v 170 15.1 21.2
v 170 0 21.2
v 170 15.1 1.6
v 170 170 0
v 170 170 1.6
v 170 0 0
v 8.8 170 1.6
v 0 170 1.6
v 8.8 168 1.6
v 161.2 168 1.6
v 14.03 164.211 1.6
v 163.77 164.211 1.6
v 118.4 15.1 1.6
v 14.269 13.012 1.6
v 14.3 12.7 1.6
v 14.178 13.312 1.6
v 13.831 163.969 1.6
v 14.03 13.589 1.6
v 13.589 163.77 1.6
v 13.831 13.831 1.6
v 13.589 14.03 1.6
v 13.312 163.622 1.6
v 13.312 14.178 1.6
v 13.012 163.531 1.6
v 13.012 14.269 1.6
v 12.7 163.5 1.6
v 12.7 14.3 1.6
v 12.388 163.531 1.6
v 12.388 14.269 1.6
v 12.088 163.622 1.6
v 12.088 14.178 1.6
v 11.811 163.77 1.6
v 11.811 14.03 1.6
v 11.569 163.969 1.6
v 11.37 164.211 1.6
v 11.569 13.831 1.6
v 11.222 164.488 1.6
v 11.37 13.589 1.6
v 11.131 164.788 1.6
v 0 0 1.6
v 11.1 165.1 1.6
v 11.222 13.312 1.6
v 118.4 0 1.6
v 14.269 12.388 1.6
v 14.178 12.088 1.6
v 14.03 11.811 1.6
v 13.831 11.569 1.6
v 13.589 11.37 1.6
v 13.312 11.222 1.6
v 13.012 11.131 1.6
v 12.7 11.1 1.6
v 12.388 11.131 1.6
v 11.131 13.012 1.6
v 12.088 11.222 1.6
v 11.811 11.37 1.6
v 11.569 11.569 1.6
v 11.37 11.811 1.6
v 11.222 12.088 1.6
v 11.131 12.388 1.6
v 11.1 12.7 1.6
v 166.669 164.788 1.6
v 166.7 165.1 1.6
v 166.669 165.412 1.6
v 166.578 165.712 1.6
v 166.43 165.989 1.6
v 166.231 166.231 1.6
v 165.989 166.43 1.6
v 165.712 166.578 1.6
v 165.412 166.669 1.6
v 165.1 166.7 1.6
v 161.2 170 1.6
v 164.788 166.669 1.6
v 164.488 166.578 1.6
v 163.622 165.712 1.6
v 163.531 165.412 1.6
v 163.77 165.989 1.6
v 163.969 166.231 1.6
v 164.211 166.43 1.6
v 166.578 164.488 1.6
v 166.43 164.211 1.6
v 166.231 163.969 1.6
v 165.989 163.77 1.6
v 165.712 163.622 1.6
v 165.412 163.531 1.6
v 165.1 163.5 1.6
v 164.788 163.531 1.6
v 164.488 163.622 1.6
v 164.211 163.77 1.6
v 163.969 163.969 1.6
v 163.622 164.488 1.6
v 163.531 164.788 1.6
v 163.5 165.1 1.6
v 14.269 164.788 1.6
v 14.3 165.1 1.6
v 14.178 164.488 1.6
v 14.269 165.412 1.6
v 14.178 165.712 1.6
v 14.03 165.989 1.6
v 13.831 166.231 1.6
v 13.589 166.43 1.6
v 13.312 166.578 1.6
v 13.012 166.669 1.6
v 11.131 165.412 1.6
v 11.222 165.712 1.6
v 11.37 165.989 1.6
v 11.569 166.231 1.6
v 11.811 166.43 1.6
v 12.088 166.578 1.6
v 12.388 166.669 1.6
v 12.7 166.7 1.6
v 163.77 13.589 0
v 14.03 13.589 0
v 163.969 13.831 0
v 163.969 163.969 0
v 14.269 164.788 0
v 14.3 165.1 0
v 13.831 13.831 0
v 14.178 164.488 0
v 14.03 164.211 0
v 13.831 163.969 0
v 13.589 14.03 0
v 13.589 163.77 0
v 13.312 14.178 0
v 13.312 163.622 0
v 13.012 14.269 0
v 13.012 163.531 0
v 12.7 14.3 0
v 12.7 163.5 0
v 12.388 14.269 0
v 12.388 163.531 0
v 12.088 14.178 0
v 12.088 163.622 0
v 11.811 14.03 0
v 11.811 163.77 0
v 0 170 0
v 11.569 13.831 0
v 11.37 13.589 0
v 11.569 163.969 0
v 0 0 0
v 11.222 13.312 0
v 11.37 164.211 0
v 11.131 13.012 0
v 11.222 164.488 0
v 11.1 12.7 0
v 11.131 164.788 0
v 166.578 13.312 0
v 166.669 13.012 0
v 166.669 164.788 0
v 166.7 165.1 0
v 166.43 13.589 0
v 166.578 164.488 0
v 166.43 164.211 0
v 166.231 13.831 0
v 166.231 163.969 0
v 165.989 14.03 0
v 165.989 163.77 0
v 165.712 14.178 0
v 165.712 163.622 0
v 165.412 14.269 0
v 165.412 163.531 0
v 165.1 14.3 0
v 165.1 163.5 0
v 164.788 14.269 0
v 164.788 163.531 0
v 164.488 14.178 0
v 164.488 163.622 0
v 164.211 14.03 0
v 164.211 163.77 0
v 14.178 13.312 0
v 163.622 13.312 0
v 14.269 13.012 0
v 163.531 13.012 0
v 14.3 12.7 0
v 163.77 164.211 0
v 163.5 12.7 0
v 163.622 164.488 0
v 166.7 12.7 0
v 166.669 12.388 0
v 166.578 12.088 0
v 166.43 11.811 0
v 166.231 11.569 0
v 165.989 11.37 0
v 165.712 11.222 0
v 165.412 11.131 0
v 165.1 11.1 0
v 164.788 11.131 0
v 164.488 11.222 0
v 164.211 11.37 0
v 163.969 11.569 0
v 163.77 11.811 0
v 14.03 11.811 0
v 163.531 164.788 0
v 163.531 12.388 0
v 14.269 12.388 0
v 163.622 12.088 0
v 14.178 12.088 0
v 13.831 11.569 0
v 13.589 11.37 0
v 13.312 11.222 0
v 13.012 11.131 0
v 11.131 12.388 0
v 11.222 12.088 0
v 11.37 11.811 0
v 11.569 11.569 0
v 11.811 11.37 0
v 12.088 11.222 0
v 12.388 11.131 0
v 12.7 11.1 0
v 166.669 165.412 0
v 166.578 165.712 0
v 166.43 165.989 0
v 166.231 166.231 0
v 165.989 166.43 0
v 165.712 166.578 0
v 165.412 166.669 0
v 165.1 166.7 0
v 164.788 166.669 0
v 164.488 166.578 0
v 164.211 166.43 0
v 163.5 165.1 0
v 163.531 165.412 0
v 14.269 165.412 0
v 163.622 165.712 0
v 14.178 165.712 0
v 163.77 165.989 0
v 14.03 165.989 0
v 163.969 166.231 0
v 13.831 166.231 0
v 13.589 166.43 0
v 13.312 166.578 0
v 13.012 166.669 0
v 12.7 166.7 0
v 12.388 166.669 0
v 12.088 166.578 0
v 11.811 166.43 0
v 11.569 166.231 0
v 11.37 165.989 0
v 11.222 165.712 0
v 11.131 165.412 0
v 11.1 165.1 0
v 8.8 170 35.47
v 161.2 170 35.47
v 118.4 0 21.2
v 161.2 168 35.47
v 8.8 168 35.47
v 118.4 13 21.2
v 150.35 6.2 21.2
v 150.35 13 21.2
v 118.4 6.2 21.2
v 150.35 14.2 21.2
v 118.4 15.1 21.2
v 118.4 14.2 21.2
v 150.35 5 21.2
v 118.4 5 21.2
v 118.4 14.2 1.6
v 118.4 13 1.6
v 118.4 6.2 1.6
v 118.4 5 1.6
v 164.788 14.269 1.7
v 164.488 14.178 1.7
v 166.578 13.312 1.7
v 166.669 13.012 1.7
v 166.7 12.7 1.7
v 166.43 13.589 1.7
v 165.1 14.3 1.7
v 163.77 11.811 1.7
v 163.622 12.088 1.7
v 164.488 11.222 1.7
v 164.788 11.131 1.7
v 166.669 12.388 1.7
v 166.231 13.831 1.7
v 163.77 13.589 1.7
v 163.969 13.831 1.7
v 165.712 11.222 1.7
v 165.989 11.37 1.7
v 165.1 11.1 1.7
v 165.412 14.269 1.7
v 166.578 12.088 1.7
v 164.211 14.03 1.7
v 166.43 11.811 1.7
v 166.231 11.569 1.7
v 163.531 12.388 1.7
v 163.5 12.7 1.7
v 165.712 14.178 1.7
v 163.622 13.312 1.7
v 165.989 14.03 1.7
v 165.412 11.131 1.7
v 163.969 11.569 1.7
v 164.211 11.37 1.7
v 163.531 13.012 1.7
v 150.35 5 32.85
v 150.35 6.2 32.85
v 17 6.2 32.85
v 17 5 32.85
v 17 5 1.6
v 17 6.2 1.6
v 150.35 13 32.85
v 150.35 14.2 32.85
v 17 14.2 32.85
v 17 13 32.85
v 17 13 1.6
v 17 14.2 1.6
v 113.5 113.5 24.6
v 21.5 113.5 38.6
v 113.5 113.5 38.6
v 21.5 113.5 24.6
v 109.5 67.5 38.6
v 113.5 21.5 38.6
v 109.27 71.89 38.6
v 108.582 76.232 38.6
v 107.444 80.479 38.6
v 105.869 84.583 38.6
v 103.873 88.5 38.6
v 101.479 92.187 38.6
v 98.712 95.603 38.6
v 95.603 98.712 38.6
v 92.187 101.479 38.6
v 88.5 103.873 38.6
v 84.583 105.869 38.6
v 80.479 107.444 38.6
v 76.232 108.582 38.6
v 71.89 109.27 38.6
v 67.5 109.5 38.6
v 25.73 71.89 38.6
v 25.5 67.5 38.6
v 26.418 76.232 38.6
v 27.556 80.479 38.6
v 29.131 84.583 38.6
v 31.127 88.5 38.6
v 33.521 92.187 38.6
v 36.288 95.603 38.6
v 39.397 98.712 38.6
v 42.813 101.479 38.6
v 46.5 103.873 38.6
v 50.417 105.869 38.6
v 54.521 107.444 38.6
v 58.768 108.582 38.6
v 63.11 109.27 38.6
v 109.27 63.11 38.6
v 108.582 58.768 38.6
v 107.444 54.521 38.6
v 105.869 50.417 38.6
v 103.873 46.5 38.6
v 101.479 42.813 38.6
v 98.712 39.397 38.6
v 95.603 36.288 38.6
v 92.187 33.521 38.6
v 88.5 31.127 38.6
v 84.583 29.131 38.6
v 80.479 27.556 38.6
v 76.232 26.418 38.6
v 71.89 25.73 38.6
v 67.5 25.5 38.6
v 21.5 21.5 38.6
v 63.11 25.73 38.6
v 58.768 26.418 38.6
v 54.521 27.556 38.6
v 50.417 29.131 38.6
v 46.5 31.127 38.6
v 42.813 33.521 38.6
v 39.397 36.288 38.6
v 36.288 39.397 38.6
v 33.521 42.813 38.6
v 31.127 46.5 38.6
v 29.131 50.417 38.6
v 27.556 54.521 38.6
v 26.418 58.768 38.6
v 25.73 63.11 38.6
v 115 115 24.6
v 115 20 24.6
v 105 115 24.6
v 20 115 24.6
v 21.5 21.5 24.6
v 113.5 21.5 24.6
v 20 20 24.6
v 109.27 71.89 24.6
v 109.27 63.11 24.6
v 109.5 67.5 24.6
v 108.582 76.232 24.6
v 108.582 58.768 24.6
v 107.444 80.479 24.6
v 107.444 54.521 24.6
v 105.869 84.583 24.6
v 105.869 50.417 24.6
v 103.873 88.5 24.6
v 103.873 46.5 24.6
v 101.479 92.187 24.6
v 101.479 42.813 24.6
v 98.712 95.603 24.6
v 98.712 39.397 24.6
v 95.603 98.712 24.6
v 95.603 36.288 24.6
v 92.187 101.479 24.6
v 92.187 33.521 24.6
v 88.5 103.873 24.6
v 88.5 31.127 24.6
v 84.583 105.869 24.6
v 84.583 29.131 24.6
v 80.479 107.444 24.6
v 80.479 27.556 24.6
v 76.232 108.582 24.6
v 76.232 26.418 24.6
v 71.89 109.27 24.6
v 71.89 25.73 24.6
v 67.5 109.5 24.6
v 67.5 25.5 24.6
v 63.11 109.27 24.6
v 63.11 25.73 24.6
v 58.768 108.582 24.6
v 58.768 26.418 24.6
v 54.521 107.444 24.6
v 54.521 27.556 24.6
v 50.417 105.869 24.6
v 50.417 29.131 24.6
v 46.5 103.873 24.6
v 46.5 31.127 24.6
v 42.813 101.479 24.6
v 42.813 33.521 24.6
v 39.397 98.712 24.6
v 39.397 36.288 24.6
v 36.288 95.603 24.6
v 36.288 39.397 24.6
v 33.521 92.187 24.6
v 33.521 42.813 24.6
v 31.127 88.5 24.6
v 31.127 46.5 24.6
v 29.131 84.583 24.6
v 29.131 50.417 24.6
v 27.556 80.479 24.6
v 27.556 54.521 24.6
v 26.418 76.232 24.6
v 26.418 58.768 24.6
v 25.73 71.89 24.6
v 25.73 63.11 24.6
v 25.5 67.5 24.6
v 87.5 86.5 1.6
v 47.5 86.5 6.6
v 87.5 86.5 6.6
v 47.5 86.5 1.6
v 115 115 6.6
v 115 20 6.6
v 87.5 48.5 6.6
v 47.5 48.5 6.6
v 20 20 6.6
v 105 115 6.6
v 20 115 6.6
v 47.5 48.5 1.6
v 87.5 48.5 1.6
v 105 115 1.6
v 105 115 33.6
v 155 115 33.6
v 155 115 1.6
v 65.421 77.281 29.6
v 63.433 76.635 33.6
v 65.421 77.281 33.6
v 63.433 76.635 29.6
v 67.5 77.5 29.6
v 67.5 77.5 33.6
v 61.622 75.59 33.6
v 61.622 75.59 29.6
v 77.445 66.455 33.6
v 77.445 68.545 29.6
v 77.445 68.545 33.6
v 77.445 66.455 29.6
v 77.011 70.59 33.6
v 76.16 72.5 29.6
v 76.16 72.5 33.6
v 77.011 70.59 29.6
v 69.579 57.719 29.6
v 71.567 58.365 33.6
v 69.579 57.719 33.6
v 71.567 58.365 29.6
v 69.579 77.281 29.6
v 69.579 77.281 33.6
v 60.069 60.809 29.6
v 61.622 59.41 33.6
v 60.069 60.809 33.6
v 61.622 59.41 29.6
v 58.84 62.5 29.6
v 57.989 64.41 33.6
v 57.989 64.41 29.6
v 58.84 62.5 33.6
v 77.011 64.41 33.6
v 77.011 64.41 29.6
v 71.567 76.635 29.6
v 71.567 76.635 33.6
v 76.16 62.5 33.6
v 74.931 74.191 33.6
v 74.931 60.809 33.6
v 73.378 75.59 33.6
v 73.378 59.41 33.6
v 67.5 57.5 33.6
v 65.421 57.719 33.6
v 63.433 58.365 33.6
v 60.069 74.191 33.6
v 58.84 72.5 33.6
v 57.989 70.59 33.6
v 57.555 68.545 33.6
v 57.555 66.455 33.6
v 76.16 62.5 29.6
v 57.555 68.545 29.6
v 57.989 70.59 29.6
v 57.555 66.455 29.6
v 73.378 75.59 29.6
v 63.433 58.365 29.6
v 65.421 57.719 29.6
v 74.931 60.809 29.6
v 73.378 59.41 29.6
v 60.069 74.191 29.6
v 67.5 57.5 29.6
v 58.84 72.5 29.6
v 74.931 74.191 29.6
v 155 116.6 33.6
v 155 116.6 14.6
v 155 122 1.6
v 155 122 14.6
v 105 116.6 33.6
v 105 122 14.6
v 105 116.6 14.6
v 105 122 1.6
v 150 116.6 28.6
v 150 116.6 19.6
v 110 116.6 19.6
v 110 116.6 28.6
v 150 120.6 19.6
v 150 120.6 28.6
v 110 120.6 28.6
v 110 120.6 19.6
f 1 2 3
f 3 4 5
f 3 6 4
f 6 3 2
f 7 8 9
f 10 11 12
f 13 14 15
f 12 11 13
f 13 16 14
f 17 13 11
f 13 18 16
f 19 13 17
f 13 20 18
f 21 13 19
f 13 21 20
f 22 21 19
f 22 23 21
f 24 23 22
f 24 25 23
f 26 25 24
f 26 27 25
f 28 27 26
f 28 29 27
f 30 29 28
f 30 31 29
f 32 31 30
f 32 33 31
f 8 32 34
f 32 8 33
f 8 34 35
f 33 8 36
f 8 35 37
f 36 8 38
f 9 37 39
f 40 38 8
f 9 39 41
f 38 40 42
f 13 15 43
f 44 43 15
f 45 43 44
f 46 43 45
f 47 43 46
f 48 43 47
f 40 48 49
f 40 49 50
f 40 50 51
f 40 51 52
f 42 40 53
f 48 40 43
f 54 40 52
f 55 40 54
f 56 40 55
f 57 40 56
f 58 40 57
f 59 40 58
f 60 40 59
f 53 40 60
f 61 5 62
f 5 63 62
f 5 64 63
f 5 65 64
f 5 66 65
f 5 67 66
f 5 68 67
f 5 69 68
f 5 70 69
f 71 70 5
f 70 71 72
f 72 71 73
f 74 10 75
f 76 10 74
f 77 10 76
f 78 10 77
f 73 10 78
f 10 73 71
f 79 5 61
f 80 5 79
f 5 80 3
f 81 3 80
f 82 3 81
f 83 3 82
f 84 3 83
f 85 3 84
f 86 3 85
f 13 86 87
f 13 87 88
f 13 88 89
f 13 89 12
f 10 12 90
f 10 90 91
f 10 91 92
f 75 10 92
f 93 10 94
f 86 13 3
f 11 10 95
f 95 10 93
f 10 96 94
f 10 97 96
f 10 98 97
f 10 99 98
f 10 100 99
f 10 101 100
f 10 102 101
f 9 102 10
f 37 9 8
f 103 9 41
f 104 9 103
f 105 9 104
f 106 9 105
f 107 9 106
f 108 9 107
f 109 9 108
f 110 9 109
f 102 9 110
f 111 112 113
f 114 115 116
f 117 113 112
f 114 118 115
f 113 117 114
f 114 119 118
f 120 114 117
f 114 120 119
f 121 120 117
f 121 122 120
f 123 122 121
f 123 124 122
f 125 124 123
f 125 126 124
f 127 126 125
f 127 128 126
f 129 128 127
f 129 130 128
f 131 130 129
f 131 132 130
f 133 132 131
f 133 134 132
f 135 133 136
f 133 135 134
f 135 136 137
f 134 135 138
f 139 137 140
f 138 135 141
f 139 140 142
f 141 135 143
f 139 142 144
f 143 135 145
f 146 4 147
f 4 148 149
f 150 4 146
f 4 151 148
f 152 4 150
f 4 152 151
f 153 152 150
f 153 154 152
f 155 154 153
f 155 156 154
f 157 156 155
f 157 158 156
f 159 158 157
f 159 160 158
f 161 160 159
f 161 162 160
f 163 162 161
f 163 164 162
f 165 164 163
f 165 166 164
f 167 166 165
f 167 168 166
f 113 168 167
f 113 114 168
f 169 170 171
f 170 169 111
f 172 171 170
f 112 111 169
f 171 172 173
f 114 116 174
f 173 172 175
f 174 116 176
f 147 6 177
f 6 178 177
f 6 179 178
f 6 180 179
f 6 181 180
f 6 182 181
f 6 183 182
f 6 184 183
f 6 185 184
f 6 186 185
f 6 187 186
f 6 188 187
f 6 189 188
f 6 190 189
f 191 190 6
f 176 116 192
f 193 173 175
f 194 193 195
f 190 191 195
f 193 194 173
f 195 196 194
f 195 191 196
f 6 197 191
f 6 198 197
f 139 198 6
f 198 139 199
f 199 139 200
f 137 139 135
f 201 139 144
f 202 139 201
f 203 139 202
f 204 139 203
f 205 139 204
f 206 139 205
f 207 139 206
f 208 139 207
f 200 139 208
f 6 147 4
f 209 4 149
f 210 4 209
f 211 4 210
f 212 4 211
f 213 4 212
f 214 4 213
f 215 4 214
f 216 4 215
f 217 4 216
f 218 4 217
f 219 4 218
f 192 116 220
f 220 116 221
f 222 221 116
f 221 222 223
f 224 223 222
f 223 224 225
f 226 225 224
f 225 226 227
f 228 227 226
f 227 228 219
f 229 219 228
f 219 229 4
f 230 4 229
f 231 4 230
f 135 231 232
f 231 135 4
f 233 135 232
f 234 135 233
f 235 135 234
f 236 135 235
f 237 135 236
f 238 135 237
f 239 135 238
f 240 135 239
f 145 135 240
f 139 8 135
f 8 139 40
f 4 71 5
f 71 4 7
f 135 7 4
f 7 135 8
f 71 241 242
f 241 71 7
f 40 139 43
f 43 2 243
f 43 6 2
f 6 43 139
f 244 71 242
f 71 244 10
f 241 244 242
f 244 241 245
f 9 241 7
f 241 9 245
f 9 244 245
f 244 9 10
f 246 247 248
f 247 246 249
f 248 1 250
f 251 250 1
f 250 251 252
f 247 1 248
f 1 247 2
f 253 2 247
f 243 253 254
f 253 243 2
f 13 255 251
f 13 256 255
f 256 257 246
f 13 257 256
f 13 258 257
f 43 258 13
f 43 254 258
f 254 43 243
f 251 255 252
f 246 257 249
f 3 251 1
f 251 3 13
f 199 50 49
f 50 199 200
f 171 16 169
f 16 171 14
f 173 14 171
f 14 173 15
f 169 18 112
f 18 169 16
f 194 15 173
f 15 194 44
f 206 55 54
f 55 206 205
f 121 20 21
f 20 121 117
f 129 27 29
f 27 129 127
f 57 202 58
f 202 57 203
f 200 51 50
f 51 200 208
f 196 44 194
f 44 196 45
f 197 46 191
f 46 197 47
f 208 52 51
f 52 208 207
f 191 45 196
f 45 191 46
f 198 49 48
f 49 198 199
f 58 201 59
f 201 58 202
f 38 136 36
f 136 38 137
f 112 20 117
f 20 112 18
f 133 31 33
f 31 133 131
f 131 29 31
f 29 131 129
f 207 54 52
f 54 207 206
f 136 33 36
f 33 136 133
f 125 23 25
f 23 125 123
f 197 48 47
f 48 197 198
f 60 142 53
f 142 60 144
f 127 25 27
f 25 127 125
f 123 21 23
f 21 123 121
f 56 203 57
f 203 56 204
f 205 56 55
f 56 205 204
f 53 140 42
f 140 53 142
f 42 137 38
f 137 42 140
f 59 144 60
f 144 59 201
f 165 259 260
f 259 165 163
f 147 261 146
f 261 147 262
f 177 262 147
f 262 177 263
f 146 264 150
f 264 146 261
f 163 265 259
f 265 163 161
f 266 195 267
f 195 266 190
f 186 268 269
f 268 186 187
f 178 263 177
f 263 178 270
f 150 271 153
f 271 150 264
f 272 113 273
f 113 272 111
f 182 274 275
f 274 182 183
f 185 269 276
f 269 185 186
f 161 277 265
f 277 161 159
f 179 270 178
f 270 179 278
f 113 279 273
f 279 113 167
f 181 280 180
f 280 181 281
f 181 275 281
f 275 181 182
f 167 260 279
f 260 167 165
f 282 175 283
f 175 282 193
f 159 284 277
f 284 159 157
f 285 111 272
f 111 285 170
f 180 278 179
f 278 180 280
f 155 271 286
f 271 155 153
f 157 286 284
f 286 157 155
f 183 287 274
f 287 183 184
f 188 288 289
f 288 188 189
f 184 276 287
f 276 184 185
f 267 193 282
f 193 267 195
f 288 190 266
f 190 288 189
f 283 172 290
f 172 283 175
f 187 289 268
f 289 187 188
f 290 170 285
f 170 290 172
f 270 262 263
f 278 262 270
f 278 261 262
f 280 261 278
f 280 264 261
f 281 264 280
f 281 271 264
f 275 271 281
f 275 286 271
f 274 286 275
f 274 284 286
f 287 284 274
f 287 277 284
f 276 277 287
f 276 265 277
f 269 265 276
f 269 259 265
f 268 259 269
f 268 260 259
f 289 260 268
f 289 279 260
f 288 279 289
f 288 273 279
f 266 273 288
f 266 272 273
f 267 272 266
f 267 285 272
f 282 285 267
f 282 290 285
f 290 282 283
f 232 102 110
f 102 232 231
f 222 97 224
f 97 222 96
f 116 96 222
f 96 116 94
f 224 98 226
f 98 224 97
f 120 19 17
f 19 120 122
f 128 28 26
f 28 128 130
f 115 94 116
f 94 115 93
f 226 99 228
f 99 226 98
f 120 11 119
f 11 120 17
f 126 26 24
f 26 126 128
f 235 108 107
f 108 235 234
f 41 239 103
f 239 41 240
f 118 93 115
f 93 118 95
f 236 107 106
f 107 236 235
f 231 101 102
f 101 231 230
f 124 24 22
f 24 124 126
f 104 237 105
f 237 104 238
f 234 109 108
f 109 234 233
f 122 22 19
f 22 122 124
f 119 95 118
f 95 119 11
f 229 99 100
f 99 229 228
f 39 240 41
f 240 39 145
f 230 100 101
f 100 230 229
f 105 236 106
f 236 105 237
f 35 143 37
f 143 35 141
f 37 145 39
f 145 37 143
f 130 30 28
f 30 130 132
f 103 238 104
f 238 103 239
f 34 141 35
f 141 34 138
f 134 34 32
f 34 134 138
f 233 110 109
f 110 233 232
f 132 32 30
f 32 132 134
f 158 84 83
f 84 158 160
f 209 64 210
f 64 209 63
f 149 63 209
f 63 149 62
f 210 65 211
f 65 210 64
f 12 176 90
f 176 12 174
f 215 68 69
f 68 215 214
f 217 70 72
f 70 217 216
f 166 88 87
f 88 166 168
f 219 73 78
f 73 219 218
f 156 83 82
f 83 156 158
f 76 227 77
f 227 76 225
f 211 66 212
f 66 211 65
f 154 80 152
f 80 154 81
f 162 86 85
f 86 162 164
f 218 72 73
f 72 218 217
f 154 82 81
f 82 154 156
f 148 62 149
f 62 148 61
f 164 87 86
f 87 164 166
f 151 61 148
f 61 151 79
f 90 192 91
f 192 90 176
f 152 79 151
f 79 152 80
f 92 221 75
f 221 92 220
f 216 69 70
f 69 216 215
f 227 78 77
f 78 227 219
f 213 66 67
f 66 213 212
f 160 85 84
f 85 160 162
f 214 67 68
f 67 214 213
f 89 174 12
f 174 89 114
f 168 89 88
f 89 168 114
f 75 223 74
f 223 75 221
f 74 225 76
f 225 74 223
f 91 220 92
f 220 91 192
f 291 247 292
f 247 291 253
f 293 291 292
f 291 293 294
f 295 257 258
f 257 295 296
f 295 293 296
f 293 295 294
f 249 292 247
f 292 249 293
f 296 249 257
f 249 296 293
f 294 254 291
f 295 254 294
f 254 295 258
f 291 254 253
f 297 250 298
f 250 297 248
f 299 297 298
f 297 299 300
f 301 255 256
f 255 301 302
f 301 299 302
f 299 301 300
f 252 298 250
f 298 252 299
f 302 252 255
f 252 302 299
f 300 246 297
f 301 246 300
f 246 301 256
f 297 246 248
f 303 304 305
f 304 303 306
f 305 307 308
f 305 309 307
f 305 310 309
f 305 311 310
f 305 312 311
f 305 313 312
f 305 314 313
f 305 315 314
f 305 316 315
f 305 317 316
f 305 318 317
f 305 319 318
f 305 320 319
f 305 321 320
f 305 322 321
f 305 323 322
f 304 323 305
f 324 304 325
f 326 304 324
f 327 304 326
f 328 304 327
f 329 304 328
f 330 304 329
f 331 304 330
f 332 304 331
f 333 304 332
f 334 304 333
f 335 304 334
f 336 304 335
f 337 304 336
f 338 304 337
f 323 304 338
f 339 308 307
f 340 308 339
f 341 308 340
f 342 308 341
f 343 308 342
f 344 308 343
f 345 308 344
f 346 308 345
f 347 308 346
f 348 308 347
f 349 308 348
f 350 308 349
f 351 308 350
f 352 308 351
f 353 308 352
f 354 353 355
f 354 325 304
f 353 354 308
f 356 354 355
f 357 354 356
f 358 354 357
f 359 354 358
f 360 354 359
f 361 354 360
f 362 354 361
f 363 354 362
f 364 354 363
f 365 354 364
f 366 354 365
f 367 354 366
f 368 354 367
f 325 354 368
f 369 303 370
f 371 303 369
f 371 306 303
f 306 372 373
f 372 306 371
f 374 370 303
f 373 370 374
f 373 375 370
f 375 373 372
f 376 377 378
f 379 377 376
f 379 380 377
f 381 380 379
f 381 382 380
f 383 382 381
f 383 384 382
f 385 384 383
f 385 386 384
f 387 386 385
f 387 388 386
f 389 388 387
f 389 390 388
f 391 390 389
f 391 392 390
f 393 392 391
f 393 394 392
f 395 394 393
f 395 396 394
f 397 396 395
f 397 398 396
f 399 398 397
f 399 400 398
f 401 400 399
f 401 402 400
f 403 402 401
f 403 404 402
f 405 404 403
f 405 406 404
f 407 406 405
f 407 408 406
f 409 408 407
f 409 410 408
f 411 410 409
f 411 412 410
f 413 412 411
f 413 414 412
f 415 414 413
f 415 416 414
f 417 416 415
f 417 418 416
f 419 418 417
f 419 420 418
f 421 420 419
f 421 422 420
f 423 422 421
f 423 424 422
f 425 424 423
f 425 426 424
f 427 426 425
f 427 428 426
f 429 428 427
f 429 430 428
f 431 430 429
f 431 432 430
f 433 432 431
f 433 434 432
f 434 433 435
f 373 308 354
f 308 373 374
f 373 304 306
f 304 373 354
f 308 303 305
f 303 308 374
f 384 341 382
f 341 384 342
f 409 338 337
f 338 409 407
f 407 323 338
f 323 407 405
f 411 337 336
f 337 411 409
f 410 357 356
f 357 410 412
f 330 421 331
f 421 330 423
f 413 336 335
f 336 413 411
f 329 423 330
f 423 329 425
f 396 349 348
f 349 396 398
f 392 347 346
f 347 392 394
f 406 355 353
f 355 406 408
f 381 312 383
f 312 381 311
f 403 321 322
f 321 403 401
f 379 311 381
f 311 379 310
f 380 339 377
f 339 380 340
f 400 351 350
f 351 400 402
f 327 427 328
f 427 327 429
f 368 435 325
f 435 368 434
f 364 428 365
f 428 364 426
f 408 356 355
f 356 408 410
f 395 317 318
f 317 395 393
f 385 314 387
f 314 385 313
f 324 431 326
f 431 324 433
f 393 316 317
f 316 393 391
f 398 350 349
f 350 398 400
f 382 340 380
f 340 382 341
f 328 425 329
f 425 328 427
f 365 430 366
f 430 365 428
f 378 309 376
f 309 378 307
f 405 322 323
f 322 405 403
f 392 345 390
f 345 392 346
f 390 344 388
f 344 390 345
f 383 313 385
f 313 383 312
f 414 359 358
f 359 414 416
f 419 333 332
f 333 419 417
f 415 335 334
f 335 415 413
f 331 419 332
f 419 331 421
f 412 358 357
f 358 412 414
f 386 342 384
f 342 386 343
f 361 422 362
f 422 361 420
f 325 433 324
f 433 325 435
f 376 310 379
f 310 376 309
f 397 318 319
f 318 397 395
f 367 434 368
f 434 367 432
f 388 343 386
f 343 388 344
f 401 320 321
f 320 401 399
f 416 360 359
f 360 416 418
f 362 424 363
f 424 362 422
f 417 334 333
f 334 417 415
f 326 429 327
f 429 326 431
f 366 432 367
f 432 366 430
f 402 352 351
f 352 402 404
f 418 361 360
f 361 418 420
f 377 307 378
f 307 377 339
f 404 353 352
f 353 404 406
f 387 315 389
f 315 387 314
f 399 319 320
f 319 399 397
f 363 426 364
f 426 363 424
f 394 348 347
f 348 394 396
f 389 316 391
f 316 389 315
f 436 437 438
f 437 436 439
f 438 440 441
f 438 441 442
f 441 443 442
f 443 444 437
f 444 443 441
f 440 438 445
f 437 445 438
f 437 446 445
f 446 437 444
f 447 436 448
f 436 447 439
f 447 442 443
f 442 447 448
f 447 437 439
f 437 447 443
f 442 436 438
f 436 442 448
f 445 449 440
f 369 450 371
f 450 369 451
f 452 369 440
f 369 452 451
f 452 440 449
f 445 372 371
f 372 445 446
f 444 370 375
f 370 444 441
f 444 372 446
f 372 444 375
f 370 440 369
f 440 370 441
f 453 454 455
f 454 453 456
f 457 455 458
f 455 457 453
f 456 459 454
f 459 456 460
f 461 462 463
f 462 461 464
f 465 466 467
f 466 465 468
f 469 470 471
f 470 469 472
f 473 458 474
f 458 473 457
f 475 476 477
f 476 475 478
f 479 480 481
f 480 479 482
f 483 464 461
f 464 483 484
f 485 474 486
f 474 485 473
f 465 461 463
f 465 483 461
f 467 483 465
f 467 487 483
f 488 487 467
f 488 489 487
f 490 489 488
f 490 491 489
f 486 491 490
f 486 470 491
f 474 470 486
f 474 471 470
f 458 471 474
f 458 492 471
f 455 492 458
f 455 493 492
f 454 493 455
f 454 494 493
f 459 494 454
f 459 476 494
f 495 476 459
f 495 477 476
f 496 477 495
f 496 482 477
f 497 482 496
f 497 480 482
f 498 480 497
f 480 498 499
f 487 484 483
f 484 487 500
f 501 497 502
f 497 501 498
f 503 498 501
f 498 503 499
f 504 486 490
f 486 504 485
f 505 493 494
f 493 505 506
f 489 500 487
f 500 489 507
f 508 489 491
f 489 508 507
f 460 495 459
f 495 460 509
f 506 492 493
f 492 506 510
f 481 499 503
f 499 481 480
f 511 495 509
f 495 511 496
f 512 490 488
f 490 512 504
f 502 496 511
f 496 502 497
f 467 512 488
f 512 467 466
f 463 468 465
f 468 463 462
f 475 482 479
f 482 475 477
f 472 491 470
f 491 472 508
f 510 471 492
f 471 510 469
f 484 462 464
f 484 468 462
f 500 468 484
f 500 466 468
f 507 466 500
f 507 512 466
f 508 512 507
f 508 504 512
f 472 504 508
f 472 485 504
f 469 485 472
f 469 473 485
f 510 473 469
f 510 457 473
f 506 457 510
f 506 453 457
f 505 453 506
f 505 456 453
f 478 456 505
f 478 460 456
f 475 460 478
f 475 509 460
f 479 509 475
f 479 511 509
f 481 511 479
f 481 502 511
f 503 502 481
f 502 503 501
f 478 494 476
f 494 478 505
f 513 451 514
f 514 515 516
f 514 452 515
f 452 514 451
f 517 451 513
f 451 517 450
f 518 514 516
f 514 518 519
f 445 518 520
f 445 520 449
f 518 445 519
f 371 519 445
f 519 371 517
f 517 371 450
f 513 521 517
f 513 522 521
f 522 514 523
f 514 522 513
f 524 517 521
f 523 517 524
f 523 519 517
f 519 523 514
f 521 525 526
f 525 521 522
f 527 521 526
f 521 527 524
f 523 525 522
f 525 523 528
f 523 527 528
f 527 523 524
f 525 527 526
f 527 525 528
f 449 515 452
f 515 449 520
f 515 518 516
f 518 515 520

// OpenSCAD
// file: ../../case/dimensions.scad
// Shared dimensions for all case components
// This file defines common parameters used across multiple case parts

// --- Wall and Material ---
wall_thickness = 3;

// --- Motherboard (Mini-ITX) ---
mobo_width = 170;
mobo_depth = 170;
mobo_pcb_thickness = 1.6;

// --- Standoffs ---
standoff_height = 6;  // Female thread portion of M3x10+6mm male-female standoff
standoff_hole_radius = 1.6;  // M3 clearance (deprecated - see integrated bottom panel design)
standoff_locations = [
    [12.7, 12.7],
    [165.1, 12.7],
    [12.7, 165.1],
    [165.1, 165.1]
];

// --- Standoff Hexagonal Receptacles (Integrated Bottom Panel Design) ---
standoff_boss_height = 2.5;              // Height of hex boss above panel interior surface
standoff_hex_size_flat_to_flat = 5.5;   // Hex size for M3 screw head (flat-to-flat)
standoff_hex_size_point_to_point = 6.35; // Hex size point-to-point (calculated from F-F)
standoff_pocket_depth = 2.2;             // Depth of hex recess for screw head
standoff_boss_diameter = 6.85;           // Overall boss diameter (hex point + FDM tolerance)
standoff_mounting_screw_length = 8;      // M3 x 8mm cap screw (recommended)
standoff_screw_clearance_hole = 3.3;     // M3 clearance hole + FDM tolerance

// --- I/O Shield ---
// Standard ATX I/O shield dimensions
io_shield_width = 158.75;   // 6.25 inches (standard ATX)
io_shield_height = 44.45;   // 1.75 inches (standard ATX)
io_shield_x_offset = (mobo_width - io_shield_width) / 2;
io_shield_z_offset = 5;     // 5mm from bottom of plate

// --- Backplate ---
backplate_height = 88.9;    // 3.5 inches
backplate_thickness = wall_thickness;

// --- CPU Cooler (Noctua NH-L12S) - Minimal/NAS configurations ---
cooler_width = 128;
cooler_depth = 146;
cooler_base_height = 35;      // Base plate and heatpipes
cooler_fan_height = 15;       // 120mm x 15mm fan (NF-A12x15)
cooler_fins_height = 20;      // Heatsink fins on top
cooler_total_height = cooler_base_height + cooler_fan_height + cooler_fins_height;  // 70mm

// --- CPU Cooler (Noctua NH-L9) - Pico configuration ---
cooler_nh_l9_width = 95;
cooler_nh_l9_depth = 95;
cooler_nh_l9_base_height = 5;       // CPU contact base
cooler_nh_l9_heatsink_height = 18;  // Aluminum fins
cooler_nh_l9_fan_height = 14;       // 92mm x 14mm fan
cooler_nh_l9_total_height = cooler_nh_l9_base_height + cooler_nh_l9_heatsink_height + cooler_nh_l9_fan_height;  // 37mm

// --- Power Supplies ---
// Flex ATX (from technical drawing)
// Standing orientation: 40mm wide (X), 150mm deep (Y), 80mm tall (Z)
flex_atx_width = 40.0;      // A: Width (X - thin side, standing)
flex_atx_length = 150.0;    // B: Length (Y - depth)
flex_atx_height = 80.0;     // G: Height (Z - tall side, standing)

// Flex ATX Mounting holes - 8-32 UNC thread (4 places on rear 40x80mm face)
flex_atx_mount_hole_radius = 2.1;   // 8-32 clearance (~4.2mm dia)
flex_atx_mount_x_inset = 5;         // Distance from left/right edges (corrected from 12.5)
flex_atx_mount_z_inset = 5;         // Distance from top/bottom edges (corrected from 8.25)

// Calculated mounting hole positions (X, Z pairs relative to PSU origin)
// Note: Only 3 holes - top-right (coords) removed where C14 inlet is located
// When viewing from back: top-right (coords) = top-left (view)
flex_atx_mount_holes = [
    [flex_atx_mount_x_inset, flex_atx_mount_z_inset],                                    // Bottom-left (coords) = Bottom-right (view)
    [flex_atx_width - flex_atx_mount_x_inset, flex_atx_mount_z_inset],                   // Bottom-right (coords) = Bottom-left (view)
    [flex_atx_mount_x_inset, flex_atx_height - flex_atx_mount_z_inset]                   // Top-left (coords) = Top-right (view)
    // Top-right (coords) removed - C14 power inlet is here = Top-left (view)
];

// SFX
sfx_length = 125;
sfx_width = 100;
sfx_height = 63.5;

// --- HDD 3.5" Dimensions ---
hdd_width = 101.6;
hdd_length = 147;
hdd_height = 26.1;

// --- NAS 2-Disk Config ---
// 2 HDDs side-by-side (controlling dimension for case width)
// See SPEC.md Section 3.3 for design rationale
nas_2disk_rail_width = 2;
nas_2disk_gap = 5;           // Gap between bays
nas_2disk_padding = 2;       // Clearance around HDDs
nas_2disk_bay_width = hdd_width + 2 * nas_2disk_rail_width;  // ~105.6mm per bay
nas_2disk_inner_width = 2 * nas_2disk_bay_width + nas_2disk_gap;  // ~216.2mm
nas_2disk_width = nas_2disk_inner_width + 2 * (wall_thickness + nas_2disk_padding);  // ~226mm

// --- PSU Compartment ---
// Flex ATX PSU in standing orientation (40mm width)
flex_atx_standing_width = flex_atx_width;  // 40mm (already in standing orientation)
psu_compartment_width = nas_2disk_width - mobo_width;  // ~56mm (40mm PSU + 16mm clearance)

// --- Interior Chamber Height (standoffs + motherboard + cooler) ---
interior_chamber_height = standoff_height + mobo_pcb_thickness + cooler_total_height;  // ~94mm

// --- Minimal Config External Dimensions ---
// Motherboard area only (without PSU)
minimal_mobo_exterior_width = mobo_width + 2 * wall_thickness;   // 176mm
minimal_mobo_exterior_depth = mobo_depth + 2 * wall_thickness;   // 176mm
minimal_exterior_height = interior_chamber_height + 2 * wall_thickness;   // ~100mm

// With Flex ATX PSU next to motherboard
// Width controlled by NAS 2-disk HDD layout (see SPEC.md Section 3.3)
minimal_with_psu_width = nas_2disk_width;  // ~226mm (PSU compartment = 56mm, PSU on side = 40mm)

// --- Interior Panel Dimensions (top/bottom panels fit between walls) ---
interior_panel_width = minimal_with_psu_width - 2 * wall_thickness;  // ~220mm
interior_panel_depth = mobo_depth;                                    // 170mm

// --- Side Panel Dimensions (left/right panels form exterior walls) ---
side_panel_height = minimal_exterior_height;                          // ~100mm
side_panel_depth = mobo_depth + 2 * wall_thickness;                   // 176mm

// --- Front/Back Panel Dimensions (fit between side walls, full exterior height) ---
front_back_panel_width = interior_panel_width;                        // ~220mm
front_back_panel_height = side_panel_height;                          // ~100mm (full exterior)

// --- Ventilation ---
honeycomb_radius = 3;
vent_padding = 5;

// --- Screw Holes for Panel Assembly ---
panel_screw_radius = 1.6;  // M3
panel_screw_inset = 8;     // Distance from edge

// --- GPU ---
gpu_length = 320;          // Max GPU length
gpu_height = 140;          // GPU PCB + cooler height
gpu_width = 60;            // 3 slots

// --- GPU Config External Dimensions ---
// From SPEC.md Section 8.4
gpu_config_width = 171;    // mm
gpu_config_depth = 378;    // mm
gpu_config_height = 190;   // mm

// --- Fans ---
fan_120_size = 120;
fan_120_thickness = 25;
fan_140_size = 140;
fan_140_thickness = 25;

// --- AIO Radiator ---
radiator_240_length = 275;
radiator_240_width = 120;
radiator_240_thickness = 27;

// --- NAS Many-Disk Config ---
// 5-8 drives mounted vertically (on narrowest side)
nas_many_drive_count = 6;  // Default 6 drives
nas_many_drive_spacing = 5;
nas_many_enclosure_height = hdd_width + wall_thickness + 5;  // ~110mm (drives on side)

// --- Power Inlet C14 ---
c14_width = 50;
c14_height = 27;
c14_depth = 30;

// --- Open Air Frame ---
// Frame cylinder height (from motherboard surface to inside panel face)
// Derived: interior_chamber_height - standoff_height - mobo_pcb_thickness
frame_cylinder_height = interior_chamber_height - standoff_height - mobo_pcb_thickness;  // ~86mm
frame_cylinder_outer_diameter = 8;     // Outer diameter
frame_cylinder_inner_diameter = 3.2;   // M3 clearance for standoff stud
frame_cylinder_thread_depth = 6;       // Matches extended_standoff_male_height (M3x6+6mm)
// file: ../ram.scad
// A module for a single DDR4 RAM stick
module ram_stick() {
    ram_l = 133.35;
    ram_h = 31.25;
    ram_t = 1.2;
    cube([ram_l, ram_t, ram_h]);
}
// file: motherboard.scad
// A module to create a rudimentary Mini-ITX motherboard model
// Includes mounting holes at standard Mini-ITX positions
// Note: Standoffs are now part of base_assembly, not the motherboard module

include <../../case/dimensions.scad>

module motherboard() {
    mobo_width = 170;
    mobo_depth = 170;
    mobo_thickness = 1.6;

    io_shield_width = 152.4;
    io_shield_height = 33.87;
    io_shield_thickness = 2;
    io_shield_x_offset = (mobo_width - io_shield_width) / 2;

    // ATX 24-pin connector dimensions
    atx_conn_l = 51.6;
    atx_conn_w = 15.1;
    atx_conn_h = 19.6;

    union() {
        // Motherboard PCB with mounting holes
        color("purple") {
            difference() {
                union() {
                    // Motherboard PCB
                    cube([mobo_width, mobo_depth, mobo_thickness]);
                    // I/O Shield
                    translate([io_shield_x_offset, mobo_depth - io_shield_thickness, mobo_thickness]) {
                        cube([io_shield_width, io_shield_thickness, io_shield_height]);
                    }
                    // 24-pin ATX Connector
                    translate([mobo_width - atx_conn_l, 0, mobo_thickness]) {
                        cube([atx_conn_l, atx_conn_w, atx_conn_h]);
                    }
                }
                // Mounting holes at Mini-ITX standoff locations
                for (pos = standoff_locations) {
                    translate([pos[0], pos[1], -0.1]) {
                        cylinder(h = mobo_thickness + 0.2, r = standoff_hole_radius, $fn = 32);
                    }
                }
            }
        }

        // Note: Standoffs removed from motherboard module (legacy code)
        // Standoffs are now part of base_assembly (integrated bottom panel design)
        // See modules/case/base/base_assembly.scad
    }
}

// Preview
motherboard();
// file: ../power/psu_pico.scad
// Pico ATX Power Supply
// Ultra-compact DC-DC converter that plugs directly into motherboard ATX header
// Models only the male connector and PSU PCB (no cable or barrel jack)
// Requires external AC-DC adapter with separate barrel jack cable

module psu_pico() {
    // Male ATX 24-pin connector dimensions (plugs into motherboard)
    atx_male_width = 50;      // Width of 24-pin connector (X axis, left-right)
    atx_male_depth = 7;    // Depth of connector (Y axis, front-back)
    atx_male_height = 13;     // Height of connector (Z axis, up-down)

    // Pico PSU PCB dimensions (extends upward from connector)
    pico_pcb_length = 50;      // Length along X axis (longest side, left-right)
    pico_pcb_height = 19;      // Height along Z axis (extends upward)
    pico_pcb_thickness = 1.6;  // Thickness along Y axis
    pico_component_depth = 4;  // Component protrusion from PCB face

    // Center PCB on connector
    pcb_x_offset = (atx_male_width - pico_pcb_length) / 2;

    union() {
        // Male ATX 24-pin connector (yellow/gold) - faces down
        color("yellow") {
            cube([atx_male_width, atx_male_depth, atx_male_height]);
        }

        // PCB Assembly (PCB + components grouped together)
        translate([pcb_x_offset, 0, atx_male_height]) {
            // Pico PSU PCB (extends upward, longest side along X)
            color("green") {
                cube([pico_pcb_length, pico_pcb_thickness, pico_pcb_height]);
            }

            // Components on PCB face (protrude in +Y direction)
            color([0.2, 0.2, 0.2]) {
                translate([5, pico_pcb_thickness, 5]) {
                    cube([pico_pcb_length - 10, pico_component_depth, pico_pcb_height - 10]);
                }
            }
        }
    }
}

// Preview
psu_pico();
// file: ../cpu_cooler_nh_l9.scad
// Noctua NH-L9 Low-Profile CPU Cooler
// Total height: 37mm (vs 70mm for NH-L12S)
// Footprint: 95mm x 95mm
// Fan: 92mm x 14mm
// Ideal for ultra-compact builds with Pico PSU

module noctua_nh_l9() {
    // Overall dimensions
    cooler_width = 95;
    cooler_depth = 95;
    cooler_total_height = 37;

    // Component heights (simplified model)
    base_height = 5;        // CPU contact plate
    heatsink_height = 18;   // Aluminum fins
    fan_height = 14;        // 92mm x 14mm fan
    // Total: 5 + 18 + 14 = 37mm

    // Fan dimensions
    fan_size = 92;
    fan_x = (cooler_width - fan_size) / 2;
    fan_y = (cooler_depth - fan_size) / 2;

    union() {
        // CPU base plate (copper/nickel plated)
        color([0.72, 0.45, 0.20]) {  // Copper color
            translate([cooler_width/2 - 19, cooler_depth/2 - 20, 0]) {
                cube([38, 40, base_height]);
            }
        }

        // Heatsink fins (aluminum)
        color([0.75, 0.75, 0.75]) {  // Aluminum
            translate([0, 0, base_height]) {
                cube([cooler_width, cooler_depth, heatsink_height]);
            }
        }

        // 92mm Fan (brown/beige Noctua colors)
        color([0.59, 0.29, 0.0]) {  // Brown frame
            translate([fan_x, fan_y, base_height + heatsink_height]) {
                difference() {
                    cube([fan_size, fan_size, fan_height]);

                    // Fan blade cutout (circular)
                    translate([fan_size/2, fan_size/2, -0.1]) {
                        cylinder(h = fan_height + 0.2, d = fan_size - 8, $fn = 60);
                    }
                }
            }
        }

        // Fan hub (center)
        color([0.82, 0.71, 0.55]) {  // Beige
            translate([cooler_width/2, cooler_depth/2, base_height + heatsink_height + fan_height/2 - 2]) {
                cylinder(h = 4, d = 20, $fn = 30);
            }
        }
    }
}

// Preview
noctua_nh_l9();
// file: motherboard_with_ram.scad
// Motherboard with RAM Assembly
// Contains: Mini-ITX motherboard + 2x RAM sticks
// Use this as foundation for cooler-specific assemblies
//
// Coordinate System:
// X-axis: 0 = left side, increases toward right
// Y-axis: 0 = front, increases toward back
// Z-axis: 0 = bottom of motherboard PCB, increases upward

use <motherboard.scad>
use <../ram.scad>

// Motherboard PCB thickness (needed for component positioning)
mobo_pcb_thickness = 1.6;

module motherboard_with_ram() {
    union() {
        // Motherboard PCB with I/O shield
        motherboard();

        // RAM (2 sticks, 5mm from front, 17mm from left of motherboard)
        // Stick spacing: 8mm between sticks
        translate([17, 5, mobo_pcb_thickness]) {
            ram_stick();
            translate([0, 8, 0]) {
                ram_stick();
            }
        }
    }
}

// Preview
motherboard_with_ram();
// main file
// Motherboard Full Pico Assembly
// Contains: motherboard_with_ram + NH-L9 cooler + Pico PSU
// For ultra-compact builds with external AC adapter
//
// Coordinate System:
// X-axis: 0 = left side, increases toward right
// Y-axis: 0 = front, increases toward back
// Z-axis: 0 = bottom of motherboard PCB, increases upward

use <motherboard_with_ram.scad>
use <../cpu_cooler_nh_l9.scad>
use <../power/psu_pico.scad>

// Motherboard dimensions
mobo_width = 170;
mobo_depth = 170;
mobo_pcb_thickness = 1.6;

module motherboard_full_pico() {
    union() {
        // Base motherboard + RAM
        motherboard_with_ram();

        // NH-L9 CPU Cooler (20mm from front and left edges of motherboard)
        // Cooler is 95x95mm, rotated 90° CCW
        // With rotation, cooler occupies X[20, 115] Y[20, 115]
        translate([115, 20, mobo_pcb_thickness]) {
            rotate([0, 0, 90]) {
                noctua_nh_l9();
            }
        }

        // Pico PSU (near back-right of motherboard)
        // Positioned to plug into ATX header area
        translate([mobo_width - 65, mobo_depth - 55, mobo_pcb_thickness]) {
            psu_pico();
        }
    }
}

// Preview
motherboard_full_pico();
